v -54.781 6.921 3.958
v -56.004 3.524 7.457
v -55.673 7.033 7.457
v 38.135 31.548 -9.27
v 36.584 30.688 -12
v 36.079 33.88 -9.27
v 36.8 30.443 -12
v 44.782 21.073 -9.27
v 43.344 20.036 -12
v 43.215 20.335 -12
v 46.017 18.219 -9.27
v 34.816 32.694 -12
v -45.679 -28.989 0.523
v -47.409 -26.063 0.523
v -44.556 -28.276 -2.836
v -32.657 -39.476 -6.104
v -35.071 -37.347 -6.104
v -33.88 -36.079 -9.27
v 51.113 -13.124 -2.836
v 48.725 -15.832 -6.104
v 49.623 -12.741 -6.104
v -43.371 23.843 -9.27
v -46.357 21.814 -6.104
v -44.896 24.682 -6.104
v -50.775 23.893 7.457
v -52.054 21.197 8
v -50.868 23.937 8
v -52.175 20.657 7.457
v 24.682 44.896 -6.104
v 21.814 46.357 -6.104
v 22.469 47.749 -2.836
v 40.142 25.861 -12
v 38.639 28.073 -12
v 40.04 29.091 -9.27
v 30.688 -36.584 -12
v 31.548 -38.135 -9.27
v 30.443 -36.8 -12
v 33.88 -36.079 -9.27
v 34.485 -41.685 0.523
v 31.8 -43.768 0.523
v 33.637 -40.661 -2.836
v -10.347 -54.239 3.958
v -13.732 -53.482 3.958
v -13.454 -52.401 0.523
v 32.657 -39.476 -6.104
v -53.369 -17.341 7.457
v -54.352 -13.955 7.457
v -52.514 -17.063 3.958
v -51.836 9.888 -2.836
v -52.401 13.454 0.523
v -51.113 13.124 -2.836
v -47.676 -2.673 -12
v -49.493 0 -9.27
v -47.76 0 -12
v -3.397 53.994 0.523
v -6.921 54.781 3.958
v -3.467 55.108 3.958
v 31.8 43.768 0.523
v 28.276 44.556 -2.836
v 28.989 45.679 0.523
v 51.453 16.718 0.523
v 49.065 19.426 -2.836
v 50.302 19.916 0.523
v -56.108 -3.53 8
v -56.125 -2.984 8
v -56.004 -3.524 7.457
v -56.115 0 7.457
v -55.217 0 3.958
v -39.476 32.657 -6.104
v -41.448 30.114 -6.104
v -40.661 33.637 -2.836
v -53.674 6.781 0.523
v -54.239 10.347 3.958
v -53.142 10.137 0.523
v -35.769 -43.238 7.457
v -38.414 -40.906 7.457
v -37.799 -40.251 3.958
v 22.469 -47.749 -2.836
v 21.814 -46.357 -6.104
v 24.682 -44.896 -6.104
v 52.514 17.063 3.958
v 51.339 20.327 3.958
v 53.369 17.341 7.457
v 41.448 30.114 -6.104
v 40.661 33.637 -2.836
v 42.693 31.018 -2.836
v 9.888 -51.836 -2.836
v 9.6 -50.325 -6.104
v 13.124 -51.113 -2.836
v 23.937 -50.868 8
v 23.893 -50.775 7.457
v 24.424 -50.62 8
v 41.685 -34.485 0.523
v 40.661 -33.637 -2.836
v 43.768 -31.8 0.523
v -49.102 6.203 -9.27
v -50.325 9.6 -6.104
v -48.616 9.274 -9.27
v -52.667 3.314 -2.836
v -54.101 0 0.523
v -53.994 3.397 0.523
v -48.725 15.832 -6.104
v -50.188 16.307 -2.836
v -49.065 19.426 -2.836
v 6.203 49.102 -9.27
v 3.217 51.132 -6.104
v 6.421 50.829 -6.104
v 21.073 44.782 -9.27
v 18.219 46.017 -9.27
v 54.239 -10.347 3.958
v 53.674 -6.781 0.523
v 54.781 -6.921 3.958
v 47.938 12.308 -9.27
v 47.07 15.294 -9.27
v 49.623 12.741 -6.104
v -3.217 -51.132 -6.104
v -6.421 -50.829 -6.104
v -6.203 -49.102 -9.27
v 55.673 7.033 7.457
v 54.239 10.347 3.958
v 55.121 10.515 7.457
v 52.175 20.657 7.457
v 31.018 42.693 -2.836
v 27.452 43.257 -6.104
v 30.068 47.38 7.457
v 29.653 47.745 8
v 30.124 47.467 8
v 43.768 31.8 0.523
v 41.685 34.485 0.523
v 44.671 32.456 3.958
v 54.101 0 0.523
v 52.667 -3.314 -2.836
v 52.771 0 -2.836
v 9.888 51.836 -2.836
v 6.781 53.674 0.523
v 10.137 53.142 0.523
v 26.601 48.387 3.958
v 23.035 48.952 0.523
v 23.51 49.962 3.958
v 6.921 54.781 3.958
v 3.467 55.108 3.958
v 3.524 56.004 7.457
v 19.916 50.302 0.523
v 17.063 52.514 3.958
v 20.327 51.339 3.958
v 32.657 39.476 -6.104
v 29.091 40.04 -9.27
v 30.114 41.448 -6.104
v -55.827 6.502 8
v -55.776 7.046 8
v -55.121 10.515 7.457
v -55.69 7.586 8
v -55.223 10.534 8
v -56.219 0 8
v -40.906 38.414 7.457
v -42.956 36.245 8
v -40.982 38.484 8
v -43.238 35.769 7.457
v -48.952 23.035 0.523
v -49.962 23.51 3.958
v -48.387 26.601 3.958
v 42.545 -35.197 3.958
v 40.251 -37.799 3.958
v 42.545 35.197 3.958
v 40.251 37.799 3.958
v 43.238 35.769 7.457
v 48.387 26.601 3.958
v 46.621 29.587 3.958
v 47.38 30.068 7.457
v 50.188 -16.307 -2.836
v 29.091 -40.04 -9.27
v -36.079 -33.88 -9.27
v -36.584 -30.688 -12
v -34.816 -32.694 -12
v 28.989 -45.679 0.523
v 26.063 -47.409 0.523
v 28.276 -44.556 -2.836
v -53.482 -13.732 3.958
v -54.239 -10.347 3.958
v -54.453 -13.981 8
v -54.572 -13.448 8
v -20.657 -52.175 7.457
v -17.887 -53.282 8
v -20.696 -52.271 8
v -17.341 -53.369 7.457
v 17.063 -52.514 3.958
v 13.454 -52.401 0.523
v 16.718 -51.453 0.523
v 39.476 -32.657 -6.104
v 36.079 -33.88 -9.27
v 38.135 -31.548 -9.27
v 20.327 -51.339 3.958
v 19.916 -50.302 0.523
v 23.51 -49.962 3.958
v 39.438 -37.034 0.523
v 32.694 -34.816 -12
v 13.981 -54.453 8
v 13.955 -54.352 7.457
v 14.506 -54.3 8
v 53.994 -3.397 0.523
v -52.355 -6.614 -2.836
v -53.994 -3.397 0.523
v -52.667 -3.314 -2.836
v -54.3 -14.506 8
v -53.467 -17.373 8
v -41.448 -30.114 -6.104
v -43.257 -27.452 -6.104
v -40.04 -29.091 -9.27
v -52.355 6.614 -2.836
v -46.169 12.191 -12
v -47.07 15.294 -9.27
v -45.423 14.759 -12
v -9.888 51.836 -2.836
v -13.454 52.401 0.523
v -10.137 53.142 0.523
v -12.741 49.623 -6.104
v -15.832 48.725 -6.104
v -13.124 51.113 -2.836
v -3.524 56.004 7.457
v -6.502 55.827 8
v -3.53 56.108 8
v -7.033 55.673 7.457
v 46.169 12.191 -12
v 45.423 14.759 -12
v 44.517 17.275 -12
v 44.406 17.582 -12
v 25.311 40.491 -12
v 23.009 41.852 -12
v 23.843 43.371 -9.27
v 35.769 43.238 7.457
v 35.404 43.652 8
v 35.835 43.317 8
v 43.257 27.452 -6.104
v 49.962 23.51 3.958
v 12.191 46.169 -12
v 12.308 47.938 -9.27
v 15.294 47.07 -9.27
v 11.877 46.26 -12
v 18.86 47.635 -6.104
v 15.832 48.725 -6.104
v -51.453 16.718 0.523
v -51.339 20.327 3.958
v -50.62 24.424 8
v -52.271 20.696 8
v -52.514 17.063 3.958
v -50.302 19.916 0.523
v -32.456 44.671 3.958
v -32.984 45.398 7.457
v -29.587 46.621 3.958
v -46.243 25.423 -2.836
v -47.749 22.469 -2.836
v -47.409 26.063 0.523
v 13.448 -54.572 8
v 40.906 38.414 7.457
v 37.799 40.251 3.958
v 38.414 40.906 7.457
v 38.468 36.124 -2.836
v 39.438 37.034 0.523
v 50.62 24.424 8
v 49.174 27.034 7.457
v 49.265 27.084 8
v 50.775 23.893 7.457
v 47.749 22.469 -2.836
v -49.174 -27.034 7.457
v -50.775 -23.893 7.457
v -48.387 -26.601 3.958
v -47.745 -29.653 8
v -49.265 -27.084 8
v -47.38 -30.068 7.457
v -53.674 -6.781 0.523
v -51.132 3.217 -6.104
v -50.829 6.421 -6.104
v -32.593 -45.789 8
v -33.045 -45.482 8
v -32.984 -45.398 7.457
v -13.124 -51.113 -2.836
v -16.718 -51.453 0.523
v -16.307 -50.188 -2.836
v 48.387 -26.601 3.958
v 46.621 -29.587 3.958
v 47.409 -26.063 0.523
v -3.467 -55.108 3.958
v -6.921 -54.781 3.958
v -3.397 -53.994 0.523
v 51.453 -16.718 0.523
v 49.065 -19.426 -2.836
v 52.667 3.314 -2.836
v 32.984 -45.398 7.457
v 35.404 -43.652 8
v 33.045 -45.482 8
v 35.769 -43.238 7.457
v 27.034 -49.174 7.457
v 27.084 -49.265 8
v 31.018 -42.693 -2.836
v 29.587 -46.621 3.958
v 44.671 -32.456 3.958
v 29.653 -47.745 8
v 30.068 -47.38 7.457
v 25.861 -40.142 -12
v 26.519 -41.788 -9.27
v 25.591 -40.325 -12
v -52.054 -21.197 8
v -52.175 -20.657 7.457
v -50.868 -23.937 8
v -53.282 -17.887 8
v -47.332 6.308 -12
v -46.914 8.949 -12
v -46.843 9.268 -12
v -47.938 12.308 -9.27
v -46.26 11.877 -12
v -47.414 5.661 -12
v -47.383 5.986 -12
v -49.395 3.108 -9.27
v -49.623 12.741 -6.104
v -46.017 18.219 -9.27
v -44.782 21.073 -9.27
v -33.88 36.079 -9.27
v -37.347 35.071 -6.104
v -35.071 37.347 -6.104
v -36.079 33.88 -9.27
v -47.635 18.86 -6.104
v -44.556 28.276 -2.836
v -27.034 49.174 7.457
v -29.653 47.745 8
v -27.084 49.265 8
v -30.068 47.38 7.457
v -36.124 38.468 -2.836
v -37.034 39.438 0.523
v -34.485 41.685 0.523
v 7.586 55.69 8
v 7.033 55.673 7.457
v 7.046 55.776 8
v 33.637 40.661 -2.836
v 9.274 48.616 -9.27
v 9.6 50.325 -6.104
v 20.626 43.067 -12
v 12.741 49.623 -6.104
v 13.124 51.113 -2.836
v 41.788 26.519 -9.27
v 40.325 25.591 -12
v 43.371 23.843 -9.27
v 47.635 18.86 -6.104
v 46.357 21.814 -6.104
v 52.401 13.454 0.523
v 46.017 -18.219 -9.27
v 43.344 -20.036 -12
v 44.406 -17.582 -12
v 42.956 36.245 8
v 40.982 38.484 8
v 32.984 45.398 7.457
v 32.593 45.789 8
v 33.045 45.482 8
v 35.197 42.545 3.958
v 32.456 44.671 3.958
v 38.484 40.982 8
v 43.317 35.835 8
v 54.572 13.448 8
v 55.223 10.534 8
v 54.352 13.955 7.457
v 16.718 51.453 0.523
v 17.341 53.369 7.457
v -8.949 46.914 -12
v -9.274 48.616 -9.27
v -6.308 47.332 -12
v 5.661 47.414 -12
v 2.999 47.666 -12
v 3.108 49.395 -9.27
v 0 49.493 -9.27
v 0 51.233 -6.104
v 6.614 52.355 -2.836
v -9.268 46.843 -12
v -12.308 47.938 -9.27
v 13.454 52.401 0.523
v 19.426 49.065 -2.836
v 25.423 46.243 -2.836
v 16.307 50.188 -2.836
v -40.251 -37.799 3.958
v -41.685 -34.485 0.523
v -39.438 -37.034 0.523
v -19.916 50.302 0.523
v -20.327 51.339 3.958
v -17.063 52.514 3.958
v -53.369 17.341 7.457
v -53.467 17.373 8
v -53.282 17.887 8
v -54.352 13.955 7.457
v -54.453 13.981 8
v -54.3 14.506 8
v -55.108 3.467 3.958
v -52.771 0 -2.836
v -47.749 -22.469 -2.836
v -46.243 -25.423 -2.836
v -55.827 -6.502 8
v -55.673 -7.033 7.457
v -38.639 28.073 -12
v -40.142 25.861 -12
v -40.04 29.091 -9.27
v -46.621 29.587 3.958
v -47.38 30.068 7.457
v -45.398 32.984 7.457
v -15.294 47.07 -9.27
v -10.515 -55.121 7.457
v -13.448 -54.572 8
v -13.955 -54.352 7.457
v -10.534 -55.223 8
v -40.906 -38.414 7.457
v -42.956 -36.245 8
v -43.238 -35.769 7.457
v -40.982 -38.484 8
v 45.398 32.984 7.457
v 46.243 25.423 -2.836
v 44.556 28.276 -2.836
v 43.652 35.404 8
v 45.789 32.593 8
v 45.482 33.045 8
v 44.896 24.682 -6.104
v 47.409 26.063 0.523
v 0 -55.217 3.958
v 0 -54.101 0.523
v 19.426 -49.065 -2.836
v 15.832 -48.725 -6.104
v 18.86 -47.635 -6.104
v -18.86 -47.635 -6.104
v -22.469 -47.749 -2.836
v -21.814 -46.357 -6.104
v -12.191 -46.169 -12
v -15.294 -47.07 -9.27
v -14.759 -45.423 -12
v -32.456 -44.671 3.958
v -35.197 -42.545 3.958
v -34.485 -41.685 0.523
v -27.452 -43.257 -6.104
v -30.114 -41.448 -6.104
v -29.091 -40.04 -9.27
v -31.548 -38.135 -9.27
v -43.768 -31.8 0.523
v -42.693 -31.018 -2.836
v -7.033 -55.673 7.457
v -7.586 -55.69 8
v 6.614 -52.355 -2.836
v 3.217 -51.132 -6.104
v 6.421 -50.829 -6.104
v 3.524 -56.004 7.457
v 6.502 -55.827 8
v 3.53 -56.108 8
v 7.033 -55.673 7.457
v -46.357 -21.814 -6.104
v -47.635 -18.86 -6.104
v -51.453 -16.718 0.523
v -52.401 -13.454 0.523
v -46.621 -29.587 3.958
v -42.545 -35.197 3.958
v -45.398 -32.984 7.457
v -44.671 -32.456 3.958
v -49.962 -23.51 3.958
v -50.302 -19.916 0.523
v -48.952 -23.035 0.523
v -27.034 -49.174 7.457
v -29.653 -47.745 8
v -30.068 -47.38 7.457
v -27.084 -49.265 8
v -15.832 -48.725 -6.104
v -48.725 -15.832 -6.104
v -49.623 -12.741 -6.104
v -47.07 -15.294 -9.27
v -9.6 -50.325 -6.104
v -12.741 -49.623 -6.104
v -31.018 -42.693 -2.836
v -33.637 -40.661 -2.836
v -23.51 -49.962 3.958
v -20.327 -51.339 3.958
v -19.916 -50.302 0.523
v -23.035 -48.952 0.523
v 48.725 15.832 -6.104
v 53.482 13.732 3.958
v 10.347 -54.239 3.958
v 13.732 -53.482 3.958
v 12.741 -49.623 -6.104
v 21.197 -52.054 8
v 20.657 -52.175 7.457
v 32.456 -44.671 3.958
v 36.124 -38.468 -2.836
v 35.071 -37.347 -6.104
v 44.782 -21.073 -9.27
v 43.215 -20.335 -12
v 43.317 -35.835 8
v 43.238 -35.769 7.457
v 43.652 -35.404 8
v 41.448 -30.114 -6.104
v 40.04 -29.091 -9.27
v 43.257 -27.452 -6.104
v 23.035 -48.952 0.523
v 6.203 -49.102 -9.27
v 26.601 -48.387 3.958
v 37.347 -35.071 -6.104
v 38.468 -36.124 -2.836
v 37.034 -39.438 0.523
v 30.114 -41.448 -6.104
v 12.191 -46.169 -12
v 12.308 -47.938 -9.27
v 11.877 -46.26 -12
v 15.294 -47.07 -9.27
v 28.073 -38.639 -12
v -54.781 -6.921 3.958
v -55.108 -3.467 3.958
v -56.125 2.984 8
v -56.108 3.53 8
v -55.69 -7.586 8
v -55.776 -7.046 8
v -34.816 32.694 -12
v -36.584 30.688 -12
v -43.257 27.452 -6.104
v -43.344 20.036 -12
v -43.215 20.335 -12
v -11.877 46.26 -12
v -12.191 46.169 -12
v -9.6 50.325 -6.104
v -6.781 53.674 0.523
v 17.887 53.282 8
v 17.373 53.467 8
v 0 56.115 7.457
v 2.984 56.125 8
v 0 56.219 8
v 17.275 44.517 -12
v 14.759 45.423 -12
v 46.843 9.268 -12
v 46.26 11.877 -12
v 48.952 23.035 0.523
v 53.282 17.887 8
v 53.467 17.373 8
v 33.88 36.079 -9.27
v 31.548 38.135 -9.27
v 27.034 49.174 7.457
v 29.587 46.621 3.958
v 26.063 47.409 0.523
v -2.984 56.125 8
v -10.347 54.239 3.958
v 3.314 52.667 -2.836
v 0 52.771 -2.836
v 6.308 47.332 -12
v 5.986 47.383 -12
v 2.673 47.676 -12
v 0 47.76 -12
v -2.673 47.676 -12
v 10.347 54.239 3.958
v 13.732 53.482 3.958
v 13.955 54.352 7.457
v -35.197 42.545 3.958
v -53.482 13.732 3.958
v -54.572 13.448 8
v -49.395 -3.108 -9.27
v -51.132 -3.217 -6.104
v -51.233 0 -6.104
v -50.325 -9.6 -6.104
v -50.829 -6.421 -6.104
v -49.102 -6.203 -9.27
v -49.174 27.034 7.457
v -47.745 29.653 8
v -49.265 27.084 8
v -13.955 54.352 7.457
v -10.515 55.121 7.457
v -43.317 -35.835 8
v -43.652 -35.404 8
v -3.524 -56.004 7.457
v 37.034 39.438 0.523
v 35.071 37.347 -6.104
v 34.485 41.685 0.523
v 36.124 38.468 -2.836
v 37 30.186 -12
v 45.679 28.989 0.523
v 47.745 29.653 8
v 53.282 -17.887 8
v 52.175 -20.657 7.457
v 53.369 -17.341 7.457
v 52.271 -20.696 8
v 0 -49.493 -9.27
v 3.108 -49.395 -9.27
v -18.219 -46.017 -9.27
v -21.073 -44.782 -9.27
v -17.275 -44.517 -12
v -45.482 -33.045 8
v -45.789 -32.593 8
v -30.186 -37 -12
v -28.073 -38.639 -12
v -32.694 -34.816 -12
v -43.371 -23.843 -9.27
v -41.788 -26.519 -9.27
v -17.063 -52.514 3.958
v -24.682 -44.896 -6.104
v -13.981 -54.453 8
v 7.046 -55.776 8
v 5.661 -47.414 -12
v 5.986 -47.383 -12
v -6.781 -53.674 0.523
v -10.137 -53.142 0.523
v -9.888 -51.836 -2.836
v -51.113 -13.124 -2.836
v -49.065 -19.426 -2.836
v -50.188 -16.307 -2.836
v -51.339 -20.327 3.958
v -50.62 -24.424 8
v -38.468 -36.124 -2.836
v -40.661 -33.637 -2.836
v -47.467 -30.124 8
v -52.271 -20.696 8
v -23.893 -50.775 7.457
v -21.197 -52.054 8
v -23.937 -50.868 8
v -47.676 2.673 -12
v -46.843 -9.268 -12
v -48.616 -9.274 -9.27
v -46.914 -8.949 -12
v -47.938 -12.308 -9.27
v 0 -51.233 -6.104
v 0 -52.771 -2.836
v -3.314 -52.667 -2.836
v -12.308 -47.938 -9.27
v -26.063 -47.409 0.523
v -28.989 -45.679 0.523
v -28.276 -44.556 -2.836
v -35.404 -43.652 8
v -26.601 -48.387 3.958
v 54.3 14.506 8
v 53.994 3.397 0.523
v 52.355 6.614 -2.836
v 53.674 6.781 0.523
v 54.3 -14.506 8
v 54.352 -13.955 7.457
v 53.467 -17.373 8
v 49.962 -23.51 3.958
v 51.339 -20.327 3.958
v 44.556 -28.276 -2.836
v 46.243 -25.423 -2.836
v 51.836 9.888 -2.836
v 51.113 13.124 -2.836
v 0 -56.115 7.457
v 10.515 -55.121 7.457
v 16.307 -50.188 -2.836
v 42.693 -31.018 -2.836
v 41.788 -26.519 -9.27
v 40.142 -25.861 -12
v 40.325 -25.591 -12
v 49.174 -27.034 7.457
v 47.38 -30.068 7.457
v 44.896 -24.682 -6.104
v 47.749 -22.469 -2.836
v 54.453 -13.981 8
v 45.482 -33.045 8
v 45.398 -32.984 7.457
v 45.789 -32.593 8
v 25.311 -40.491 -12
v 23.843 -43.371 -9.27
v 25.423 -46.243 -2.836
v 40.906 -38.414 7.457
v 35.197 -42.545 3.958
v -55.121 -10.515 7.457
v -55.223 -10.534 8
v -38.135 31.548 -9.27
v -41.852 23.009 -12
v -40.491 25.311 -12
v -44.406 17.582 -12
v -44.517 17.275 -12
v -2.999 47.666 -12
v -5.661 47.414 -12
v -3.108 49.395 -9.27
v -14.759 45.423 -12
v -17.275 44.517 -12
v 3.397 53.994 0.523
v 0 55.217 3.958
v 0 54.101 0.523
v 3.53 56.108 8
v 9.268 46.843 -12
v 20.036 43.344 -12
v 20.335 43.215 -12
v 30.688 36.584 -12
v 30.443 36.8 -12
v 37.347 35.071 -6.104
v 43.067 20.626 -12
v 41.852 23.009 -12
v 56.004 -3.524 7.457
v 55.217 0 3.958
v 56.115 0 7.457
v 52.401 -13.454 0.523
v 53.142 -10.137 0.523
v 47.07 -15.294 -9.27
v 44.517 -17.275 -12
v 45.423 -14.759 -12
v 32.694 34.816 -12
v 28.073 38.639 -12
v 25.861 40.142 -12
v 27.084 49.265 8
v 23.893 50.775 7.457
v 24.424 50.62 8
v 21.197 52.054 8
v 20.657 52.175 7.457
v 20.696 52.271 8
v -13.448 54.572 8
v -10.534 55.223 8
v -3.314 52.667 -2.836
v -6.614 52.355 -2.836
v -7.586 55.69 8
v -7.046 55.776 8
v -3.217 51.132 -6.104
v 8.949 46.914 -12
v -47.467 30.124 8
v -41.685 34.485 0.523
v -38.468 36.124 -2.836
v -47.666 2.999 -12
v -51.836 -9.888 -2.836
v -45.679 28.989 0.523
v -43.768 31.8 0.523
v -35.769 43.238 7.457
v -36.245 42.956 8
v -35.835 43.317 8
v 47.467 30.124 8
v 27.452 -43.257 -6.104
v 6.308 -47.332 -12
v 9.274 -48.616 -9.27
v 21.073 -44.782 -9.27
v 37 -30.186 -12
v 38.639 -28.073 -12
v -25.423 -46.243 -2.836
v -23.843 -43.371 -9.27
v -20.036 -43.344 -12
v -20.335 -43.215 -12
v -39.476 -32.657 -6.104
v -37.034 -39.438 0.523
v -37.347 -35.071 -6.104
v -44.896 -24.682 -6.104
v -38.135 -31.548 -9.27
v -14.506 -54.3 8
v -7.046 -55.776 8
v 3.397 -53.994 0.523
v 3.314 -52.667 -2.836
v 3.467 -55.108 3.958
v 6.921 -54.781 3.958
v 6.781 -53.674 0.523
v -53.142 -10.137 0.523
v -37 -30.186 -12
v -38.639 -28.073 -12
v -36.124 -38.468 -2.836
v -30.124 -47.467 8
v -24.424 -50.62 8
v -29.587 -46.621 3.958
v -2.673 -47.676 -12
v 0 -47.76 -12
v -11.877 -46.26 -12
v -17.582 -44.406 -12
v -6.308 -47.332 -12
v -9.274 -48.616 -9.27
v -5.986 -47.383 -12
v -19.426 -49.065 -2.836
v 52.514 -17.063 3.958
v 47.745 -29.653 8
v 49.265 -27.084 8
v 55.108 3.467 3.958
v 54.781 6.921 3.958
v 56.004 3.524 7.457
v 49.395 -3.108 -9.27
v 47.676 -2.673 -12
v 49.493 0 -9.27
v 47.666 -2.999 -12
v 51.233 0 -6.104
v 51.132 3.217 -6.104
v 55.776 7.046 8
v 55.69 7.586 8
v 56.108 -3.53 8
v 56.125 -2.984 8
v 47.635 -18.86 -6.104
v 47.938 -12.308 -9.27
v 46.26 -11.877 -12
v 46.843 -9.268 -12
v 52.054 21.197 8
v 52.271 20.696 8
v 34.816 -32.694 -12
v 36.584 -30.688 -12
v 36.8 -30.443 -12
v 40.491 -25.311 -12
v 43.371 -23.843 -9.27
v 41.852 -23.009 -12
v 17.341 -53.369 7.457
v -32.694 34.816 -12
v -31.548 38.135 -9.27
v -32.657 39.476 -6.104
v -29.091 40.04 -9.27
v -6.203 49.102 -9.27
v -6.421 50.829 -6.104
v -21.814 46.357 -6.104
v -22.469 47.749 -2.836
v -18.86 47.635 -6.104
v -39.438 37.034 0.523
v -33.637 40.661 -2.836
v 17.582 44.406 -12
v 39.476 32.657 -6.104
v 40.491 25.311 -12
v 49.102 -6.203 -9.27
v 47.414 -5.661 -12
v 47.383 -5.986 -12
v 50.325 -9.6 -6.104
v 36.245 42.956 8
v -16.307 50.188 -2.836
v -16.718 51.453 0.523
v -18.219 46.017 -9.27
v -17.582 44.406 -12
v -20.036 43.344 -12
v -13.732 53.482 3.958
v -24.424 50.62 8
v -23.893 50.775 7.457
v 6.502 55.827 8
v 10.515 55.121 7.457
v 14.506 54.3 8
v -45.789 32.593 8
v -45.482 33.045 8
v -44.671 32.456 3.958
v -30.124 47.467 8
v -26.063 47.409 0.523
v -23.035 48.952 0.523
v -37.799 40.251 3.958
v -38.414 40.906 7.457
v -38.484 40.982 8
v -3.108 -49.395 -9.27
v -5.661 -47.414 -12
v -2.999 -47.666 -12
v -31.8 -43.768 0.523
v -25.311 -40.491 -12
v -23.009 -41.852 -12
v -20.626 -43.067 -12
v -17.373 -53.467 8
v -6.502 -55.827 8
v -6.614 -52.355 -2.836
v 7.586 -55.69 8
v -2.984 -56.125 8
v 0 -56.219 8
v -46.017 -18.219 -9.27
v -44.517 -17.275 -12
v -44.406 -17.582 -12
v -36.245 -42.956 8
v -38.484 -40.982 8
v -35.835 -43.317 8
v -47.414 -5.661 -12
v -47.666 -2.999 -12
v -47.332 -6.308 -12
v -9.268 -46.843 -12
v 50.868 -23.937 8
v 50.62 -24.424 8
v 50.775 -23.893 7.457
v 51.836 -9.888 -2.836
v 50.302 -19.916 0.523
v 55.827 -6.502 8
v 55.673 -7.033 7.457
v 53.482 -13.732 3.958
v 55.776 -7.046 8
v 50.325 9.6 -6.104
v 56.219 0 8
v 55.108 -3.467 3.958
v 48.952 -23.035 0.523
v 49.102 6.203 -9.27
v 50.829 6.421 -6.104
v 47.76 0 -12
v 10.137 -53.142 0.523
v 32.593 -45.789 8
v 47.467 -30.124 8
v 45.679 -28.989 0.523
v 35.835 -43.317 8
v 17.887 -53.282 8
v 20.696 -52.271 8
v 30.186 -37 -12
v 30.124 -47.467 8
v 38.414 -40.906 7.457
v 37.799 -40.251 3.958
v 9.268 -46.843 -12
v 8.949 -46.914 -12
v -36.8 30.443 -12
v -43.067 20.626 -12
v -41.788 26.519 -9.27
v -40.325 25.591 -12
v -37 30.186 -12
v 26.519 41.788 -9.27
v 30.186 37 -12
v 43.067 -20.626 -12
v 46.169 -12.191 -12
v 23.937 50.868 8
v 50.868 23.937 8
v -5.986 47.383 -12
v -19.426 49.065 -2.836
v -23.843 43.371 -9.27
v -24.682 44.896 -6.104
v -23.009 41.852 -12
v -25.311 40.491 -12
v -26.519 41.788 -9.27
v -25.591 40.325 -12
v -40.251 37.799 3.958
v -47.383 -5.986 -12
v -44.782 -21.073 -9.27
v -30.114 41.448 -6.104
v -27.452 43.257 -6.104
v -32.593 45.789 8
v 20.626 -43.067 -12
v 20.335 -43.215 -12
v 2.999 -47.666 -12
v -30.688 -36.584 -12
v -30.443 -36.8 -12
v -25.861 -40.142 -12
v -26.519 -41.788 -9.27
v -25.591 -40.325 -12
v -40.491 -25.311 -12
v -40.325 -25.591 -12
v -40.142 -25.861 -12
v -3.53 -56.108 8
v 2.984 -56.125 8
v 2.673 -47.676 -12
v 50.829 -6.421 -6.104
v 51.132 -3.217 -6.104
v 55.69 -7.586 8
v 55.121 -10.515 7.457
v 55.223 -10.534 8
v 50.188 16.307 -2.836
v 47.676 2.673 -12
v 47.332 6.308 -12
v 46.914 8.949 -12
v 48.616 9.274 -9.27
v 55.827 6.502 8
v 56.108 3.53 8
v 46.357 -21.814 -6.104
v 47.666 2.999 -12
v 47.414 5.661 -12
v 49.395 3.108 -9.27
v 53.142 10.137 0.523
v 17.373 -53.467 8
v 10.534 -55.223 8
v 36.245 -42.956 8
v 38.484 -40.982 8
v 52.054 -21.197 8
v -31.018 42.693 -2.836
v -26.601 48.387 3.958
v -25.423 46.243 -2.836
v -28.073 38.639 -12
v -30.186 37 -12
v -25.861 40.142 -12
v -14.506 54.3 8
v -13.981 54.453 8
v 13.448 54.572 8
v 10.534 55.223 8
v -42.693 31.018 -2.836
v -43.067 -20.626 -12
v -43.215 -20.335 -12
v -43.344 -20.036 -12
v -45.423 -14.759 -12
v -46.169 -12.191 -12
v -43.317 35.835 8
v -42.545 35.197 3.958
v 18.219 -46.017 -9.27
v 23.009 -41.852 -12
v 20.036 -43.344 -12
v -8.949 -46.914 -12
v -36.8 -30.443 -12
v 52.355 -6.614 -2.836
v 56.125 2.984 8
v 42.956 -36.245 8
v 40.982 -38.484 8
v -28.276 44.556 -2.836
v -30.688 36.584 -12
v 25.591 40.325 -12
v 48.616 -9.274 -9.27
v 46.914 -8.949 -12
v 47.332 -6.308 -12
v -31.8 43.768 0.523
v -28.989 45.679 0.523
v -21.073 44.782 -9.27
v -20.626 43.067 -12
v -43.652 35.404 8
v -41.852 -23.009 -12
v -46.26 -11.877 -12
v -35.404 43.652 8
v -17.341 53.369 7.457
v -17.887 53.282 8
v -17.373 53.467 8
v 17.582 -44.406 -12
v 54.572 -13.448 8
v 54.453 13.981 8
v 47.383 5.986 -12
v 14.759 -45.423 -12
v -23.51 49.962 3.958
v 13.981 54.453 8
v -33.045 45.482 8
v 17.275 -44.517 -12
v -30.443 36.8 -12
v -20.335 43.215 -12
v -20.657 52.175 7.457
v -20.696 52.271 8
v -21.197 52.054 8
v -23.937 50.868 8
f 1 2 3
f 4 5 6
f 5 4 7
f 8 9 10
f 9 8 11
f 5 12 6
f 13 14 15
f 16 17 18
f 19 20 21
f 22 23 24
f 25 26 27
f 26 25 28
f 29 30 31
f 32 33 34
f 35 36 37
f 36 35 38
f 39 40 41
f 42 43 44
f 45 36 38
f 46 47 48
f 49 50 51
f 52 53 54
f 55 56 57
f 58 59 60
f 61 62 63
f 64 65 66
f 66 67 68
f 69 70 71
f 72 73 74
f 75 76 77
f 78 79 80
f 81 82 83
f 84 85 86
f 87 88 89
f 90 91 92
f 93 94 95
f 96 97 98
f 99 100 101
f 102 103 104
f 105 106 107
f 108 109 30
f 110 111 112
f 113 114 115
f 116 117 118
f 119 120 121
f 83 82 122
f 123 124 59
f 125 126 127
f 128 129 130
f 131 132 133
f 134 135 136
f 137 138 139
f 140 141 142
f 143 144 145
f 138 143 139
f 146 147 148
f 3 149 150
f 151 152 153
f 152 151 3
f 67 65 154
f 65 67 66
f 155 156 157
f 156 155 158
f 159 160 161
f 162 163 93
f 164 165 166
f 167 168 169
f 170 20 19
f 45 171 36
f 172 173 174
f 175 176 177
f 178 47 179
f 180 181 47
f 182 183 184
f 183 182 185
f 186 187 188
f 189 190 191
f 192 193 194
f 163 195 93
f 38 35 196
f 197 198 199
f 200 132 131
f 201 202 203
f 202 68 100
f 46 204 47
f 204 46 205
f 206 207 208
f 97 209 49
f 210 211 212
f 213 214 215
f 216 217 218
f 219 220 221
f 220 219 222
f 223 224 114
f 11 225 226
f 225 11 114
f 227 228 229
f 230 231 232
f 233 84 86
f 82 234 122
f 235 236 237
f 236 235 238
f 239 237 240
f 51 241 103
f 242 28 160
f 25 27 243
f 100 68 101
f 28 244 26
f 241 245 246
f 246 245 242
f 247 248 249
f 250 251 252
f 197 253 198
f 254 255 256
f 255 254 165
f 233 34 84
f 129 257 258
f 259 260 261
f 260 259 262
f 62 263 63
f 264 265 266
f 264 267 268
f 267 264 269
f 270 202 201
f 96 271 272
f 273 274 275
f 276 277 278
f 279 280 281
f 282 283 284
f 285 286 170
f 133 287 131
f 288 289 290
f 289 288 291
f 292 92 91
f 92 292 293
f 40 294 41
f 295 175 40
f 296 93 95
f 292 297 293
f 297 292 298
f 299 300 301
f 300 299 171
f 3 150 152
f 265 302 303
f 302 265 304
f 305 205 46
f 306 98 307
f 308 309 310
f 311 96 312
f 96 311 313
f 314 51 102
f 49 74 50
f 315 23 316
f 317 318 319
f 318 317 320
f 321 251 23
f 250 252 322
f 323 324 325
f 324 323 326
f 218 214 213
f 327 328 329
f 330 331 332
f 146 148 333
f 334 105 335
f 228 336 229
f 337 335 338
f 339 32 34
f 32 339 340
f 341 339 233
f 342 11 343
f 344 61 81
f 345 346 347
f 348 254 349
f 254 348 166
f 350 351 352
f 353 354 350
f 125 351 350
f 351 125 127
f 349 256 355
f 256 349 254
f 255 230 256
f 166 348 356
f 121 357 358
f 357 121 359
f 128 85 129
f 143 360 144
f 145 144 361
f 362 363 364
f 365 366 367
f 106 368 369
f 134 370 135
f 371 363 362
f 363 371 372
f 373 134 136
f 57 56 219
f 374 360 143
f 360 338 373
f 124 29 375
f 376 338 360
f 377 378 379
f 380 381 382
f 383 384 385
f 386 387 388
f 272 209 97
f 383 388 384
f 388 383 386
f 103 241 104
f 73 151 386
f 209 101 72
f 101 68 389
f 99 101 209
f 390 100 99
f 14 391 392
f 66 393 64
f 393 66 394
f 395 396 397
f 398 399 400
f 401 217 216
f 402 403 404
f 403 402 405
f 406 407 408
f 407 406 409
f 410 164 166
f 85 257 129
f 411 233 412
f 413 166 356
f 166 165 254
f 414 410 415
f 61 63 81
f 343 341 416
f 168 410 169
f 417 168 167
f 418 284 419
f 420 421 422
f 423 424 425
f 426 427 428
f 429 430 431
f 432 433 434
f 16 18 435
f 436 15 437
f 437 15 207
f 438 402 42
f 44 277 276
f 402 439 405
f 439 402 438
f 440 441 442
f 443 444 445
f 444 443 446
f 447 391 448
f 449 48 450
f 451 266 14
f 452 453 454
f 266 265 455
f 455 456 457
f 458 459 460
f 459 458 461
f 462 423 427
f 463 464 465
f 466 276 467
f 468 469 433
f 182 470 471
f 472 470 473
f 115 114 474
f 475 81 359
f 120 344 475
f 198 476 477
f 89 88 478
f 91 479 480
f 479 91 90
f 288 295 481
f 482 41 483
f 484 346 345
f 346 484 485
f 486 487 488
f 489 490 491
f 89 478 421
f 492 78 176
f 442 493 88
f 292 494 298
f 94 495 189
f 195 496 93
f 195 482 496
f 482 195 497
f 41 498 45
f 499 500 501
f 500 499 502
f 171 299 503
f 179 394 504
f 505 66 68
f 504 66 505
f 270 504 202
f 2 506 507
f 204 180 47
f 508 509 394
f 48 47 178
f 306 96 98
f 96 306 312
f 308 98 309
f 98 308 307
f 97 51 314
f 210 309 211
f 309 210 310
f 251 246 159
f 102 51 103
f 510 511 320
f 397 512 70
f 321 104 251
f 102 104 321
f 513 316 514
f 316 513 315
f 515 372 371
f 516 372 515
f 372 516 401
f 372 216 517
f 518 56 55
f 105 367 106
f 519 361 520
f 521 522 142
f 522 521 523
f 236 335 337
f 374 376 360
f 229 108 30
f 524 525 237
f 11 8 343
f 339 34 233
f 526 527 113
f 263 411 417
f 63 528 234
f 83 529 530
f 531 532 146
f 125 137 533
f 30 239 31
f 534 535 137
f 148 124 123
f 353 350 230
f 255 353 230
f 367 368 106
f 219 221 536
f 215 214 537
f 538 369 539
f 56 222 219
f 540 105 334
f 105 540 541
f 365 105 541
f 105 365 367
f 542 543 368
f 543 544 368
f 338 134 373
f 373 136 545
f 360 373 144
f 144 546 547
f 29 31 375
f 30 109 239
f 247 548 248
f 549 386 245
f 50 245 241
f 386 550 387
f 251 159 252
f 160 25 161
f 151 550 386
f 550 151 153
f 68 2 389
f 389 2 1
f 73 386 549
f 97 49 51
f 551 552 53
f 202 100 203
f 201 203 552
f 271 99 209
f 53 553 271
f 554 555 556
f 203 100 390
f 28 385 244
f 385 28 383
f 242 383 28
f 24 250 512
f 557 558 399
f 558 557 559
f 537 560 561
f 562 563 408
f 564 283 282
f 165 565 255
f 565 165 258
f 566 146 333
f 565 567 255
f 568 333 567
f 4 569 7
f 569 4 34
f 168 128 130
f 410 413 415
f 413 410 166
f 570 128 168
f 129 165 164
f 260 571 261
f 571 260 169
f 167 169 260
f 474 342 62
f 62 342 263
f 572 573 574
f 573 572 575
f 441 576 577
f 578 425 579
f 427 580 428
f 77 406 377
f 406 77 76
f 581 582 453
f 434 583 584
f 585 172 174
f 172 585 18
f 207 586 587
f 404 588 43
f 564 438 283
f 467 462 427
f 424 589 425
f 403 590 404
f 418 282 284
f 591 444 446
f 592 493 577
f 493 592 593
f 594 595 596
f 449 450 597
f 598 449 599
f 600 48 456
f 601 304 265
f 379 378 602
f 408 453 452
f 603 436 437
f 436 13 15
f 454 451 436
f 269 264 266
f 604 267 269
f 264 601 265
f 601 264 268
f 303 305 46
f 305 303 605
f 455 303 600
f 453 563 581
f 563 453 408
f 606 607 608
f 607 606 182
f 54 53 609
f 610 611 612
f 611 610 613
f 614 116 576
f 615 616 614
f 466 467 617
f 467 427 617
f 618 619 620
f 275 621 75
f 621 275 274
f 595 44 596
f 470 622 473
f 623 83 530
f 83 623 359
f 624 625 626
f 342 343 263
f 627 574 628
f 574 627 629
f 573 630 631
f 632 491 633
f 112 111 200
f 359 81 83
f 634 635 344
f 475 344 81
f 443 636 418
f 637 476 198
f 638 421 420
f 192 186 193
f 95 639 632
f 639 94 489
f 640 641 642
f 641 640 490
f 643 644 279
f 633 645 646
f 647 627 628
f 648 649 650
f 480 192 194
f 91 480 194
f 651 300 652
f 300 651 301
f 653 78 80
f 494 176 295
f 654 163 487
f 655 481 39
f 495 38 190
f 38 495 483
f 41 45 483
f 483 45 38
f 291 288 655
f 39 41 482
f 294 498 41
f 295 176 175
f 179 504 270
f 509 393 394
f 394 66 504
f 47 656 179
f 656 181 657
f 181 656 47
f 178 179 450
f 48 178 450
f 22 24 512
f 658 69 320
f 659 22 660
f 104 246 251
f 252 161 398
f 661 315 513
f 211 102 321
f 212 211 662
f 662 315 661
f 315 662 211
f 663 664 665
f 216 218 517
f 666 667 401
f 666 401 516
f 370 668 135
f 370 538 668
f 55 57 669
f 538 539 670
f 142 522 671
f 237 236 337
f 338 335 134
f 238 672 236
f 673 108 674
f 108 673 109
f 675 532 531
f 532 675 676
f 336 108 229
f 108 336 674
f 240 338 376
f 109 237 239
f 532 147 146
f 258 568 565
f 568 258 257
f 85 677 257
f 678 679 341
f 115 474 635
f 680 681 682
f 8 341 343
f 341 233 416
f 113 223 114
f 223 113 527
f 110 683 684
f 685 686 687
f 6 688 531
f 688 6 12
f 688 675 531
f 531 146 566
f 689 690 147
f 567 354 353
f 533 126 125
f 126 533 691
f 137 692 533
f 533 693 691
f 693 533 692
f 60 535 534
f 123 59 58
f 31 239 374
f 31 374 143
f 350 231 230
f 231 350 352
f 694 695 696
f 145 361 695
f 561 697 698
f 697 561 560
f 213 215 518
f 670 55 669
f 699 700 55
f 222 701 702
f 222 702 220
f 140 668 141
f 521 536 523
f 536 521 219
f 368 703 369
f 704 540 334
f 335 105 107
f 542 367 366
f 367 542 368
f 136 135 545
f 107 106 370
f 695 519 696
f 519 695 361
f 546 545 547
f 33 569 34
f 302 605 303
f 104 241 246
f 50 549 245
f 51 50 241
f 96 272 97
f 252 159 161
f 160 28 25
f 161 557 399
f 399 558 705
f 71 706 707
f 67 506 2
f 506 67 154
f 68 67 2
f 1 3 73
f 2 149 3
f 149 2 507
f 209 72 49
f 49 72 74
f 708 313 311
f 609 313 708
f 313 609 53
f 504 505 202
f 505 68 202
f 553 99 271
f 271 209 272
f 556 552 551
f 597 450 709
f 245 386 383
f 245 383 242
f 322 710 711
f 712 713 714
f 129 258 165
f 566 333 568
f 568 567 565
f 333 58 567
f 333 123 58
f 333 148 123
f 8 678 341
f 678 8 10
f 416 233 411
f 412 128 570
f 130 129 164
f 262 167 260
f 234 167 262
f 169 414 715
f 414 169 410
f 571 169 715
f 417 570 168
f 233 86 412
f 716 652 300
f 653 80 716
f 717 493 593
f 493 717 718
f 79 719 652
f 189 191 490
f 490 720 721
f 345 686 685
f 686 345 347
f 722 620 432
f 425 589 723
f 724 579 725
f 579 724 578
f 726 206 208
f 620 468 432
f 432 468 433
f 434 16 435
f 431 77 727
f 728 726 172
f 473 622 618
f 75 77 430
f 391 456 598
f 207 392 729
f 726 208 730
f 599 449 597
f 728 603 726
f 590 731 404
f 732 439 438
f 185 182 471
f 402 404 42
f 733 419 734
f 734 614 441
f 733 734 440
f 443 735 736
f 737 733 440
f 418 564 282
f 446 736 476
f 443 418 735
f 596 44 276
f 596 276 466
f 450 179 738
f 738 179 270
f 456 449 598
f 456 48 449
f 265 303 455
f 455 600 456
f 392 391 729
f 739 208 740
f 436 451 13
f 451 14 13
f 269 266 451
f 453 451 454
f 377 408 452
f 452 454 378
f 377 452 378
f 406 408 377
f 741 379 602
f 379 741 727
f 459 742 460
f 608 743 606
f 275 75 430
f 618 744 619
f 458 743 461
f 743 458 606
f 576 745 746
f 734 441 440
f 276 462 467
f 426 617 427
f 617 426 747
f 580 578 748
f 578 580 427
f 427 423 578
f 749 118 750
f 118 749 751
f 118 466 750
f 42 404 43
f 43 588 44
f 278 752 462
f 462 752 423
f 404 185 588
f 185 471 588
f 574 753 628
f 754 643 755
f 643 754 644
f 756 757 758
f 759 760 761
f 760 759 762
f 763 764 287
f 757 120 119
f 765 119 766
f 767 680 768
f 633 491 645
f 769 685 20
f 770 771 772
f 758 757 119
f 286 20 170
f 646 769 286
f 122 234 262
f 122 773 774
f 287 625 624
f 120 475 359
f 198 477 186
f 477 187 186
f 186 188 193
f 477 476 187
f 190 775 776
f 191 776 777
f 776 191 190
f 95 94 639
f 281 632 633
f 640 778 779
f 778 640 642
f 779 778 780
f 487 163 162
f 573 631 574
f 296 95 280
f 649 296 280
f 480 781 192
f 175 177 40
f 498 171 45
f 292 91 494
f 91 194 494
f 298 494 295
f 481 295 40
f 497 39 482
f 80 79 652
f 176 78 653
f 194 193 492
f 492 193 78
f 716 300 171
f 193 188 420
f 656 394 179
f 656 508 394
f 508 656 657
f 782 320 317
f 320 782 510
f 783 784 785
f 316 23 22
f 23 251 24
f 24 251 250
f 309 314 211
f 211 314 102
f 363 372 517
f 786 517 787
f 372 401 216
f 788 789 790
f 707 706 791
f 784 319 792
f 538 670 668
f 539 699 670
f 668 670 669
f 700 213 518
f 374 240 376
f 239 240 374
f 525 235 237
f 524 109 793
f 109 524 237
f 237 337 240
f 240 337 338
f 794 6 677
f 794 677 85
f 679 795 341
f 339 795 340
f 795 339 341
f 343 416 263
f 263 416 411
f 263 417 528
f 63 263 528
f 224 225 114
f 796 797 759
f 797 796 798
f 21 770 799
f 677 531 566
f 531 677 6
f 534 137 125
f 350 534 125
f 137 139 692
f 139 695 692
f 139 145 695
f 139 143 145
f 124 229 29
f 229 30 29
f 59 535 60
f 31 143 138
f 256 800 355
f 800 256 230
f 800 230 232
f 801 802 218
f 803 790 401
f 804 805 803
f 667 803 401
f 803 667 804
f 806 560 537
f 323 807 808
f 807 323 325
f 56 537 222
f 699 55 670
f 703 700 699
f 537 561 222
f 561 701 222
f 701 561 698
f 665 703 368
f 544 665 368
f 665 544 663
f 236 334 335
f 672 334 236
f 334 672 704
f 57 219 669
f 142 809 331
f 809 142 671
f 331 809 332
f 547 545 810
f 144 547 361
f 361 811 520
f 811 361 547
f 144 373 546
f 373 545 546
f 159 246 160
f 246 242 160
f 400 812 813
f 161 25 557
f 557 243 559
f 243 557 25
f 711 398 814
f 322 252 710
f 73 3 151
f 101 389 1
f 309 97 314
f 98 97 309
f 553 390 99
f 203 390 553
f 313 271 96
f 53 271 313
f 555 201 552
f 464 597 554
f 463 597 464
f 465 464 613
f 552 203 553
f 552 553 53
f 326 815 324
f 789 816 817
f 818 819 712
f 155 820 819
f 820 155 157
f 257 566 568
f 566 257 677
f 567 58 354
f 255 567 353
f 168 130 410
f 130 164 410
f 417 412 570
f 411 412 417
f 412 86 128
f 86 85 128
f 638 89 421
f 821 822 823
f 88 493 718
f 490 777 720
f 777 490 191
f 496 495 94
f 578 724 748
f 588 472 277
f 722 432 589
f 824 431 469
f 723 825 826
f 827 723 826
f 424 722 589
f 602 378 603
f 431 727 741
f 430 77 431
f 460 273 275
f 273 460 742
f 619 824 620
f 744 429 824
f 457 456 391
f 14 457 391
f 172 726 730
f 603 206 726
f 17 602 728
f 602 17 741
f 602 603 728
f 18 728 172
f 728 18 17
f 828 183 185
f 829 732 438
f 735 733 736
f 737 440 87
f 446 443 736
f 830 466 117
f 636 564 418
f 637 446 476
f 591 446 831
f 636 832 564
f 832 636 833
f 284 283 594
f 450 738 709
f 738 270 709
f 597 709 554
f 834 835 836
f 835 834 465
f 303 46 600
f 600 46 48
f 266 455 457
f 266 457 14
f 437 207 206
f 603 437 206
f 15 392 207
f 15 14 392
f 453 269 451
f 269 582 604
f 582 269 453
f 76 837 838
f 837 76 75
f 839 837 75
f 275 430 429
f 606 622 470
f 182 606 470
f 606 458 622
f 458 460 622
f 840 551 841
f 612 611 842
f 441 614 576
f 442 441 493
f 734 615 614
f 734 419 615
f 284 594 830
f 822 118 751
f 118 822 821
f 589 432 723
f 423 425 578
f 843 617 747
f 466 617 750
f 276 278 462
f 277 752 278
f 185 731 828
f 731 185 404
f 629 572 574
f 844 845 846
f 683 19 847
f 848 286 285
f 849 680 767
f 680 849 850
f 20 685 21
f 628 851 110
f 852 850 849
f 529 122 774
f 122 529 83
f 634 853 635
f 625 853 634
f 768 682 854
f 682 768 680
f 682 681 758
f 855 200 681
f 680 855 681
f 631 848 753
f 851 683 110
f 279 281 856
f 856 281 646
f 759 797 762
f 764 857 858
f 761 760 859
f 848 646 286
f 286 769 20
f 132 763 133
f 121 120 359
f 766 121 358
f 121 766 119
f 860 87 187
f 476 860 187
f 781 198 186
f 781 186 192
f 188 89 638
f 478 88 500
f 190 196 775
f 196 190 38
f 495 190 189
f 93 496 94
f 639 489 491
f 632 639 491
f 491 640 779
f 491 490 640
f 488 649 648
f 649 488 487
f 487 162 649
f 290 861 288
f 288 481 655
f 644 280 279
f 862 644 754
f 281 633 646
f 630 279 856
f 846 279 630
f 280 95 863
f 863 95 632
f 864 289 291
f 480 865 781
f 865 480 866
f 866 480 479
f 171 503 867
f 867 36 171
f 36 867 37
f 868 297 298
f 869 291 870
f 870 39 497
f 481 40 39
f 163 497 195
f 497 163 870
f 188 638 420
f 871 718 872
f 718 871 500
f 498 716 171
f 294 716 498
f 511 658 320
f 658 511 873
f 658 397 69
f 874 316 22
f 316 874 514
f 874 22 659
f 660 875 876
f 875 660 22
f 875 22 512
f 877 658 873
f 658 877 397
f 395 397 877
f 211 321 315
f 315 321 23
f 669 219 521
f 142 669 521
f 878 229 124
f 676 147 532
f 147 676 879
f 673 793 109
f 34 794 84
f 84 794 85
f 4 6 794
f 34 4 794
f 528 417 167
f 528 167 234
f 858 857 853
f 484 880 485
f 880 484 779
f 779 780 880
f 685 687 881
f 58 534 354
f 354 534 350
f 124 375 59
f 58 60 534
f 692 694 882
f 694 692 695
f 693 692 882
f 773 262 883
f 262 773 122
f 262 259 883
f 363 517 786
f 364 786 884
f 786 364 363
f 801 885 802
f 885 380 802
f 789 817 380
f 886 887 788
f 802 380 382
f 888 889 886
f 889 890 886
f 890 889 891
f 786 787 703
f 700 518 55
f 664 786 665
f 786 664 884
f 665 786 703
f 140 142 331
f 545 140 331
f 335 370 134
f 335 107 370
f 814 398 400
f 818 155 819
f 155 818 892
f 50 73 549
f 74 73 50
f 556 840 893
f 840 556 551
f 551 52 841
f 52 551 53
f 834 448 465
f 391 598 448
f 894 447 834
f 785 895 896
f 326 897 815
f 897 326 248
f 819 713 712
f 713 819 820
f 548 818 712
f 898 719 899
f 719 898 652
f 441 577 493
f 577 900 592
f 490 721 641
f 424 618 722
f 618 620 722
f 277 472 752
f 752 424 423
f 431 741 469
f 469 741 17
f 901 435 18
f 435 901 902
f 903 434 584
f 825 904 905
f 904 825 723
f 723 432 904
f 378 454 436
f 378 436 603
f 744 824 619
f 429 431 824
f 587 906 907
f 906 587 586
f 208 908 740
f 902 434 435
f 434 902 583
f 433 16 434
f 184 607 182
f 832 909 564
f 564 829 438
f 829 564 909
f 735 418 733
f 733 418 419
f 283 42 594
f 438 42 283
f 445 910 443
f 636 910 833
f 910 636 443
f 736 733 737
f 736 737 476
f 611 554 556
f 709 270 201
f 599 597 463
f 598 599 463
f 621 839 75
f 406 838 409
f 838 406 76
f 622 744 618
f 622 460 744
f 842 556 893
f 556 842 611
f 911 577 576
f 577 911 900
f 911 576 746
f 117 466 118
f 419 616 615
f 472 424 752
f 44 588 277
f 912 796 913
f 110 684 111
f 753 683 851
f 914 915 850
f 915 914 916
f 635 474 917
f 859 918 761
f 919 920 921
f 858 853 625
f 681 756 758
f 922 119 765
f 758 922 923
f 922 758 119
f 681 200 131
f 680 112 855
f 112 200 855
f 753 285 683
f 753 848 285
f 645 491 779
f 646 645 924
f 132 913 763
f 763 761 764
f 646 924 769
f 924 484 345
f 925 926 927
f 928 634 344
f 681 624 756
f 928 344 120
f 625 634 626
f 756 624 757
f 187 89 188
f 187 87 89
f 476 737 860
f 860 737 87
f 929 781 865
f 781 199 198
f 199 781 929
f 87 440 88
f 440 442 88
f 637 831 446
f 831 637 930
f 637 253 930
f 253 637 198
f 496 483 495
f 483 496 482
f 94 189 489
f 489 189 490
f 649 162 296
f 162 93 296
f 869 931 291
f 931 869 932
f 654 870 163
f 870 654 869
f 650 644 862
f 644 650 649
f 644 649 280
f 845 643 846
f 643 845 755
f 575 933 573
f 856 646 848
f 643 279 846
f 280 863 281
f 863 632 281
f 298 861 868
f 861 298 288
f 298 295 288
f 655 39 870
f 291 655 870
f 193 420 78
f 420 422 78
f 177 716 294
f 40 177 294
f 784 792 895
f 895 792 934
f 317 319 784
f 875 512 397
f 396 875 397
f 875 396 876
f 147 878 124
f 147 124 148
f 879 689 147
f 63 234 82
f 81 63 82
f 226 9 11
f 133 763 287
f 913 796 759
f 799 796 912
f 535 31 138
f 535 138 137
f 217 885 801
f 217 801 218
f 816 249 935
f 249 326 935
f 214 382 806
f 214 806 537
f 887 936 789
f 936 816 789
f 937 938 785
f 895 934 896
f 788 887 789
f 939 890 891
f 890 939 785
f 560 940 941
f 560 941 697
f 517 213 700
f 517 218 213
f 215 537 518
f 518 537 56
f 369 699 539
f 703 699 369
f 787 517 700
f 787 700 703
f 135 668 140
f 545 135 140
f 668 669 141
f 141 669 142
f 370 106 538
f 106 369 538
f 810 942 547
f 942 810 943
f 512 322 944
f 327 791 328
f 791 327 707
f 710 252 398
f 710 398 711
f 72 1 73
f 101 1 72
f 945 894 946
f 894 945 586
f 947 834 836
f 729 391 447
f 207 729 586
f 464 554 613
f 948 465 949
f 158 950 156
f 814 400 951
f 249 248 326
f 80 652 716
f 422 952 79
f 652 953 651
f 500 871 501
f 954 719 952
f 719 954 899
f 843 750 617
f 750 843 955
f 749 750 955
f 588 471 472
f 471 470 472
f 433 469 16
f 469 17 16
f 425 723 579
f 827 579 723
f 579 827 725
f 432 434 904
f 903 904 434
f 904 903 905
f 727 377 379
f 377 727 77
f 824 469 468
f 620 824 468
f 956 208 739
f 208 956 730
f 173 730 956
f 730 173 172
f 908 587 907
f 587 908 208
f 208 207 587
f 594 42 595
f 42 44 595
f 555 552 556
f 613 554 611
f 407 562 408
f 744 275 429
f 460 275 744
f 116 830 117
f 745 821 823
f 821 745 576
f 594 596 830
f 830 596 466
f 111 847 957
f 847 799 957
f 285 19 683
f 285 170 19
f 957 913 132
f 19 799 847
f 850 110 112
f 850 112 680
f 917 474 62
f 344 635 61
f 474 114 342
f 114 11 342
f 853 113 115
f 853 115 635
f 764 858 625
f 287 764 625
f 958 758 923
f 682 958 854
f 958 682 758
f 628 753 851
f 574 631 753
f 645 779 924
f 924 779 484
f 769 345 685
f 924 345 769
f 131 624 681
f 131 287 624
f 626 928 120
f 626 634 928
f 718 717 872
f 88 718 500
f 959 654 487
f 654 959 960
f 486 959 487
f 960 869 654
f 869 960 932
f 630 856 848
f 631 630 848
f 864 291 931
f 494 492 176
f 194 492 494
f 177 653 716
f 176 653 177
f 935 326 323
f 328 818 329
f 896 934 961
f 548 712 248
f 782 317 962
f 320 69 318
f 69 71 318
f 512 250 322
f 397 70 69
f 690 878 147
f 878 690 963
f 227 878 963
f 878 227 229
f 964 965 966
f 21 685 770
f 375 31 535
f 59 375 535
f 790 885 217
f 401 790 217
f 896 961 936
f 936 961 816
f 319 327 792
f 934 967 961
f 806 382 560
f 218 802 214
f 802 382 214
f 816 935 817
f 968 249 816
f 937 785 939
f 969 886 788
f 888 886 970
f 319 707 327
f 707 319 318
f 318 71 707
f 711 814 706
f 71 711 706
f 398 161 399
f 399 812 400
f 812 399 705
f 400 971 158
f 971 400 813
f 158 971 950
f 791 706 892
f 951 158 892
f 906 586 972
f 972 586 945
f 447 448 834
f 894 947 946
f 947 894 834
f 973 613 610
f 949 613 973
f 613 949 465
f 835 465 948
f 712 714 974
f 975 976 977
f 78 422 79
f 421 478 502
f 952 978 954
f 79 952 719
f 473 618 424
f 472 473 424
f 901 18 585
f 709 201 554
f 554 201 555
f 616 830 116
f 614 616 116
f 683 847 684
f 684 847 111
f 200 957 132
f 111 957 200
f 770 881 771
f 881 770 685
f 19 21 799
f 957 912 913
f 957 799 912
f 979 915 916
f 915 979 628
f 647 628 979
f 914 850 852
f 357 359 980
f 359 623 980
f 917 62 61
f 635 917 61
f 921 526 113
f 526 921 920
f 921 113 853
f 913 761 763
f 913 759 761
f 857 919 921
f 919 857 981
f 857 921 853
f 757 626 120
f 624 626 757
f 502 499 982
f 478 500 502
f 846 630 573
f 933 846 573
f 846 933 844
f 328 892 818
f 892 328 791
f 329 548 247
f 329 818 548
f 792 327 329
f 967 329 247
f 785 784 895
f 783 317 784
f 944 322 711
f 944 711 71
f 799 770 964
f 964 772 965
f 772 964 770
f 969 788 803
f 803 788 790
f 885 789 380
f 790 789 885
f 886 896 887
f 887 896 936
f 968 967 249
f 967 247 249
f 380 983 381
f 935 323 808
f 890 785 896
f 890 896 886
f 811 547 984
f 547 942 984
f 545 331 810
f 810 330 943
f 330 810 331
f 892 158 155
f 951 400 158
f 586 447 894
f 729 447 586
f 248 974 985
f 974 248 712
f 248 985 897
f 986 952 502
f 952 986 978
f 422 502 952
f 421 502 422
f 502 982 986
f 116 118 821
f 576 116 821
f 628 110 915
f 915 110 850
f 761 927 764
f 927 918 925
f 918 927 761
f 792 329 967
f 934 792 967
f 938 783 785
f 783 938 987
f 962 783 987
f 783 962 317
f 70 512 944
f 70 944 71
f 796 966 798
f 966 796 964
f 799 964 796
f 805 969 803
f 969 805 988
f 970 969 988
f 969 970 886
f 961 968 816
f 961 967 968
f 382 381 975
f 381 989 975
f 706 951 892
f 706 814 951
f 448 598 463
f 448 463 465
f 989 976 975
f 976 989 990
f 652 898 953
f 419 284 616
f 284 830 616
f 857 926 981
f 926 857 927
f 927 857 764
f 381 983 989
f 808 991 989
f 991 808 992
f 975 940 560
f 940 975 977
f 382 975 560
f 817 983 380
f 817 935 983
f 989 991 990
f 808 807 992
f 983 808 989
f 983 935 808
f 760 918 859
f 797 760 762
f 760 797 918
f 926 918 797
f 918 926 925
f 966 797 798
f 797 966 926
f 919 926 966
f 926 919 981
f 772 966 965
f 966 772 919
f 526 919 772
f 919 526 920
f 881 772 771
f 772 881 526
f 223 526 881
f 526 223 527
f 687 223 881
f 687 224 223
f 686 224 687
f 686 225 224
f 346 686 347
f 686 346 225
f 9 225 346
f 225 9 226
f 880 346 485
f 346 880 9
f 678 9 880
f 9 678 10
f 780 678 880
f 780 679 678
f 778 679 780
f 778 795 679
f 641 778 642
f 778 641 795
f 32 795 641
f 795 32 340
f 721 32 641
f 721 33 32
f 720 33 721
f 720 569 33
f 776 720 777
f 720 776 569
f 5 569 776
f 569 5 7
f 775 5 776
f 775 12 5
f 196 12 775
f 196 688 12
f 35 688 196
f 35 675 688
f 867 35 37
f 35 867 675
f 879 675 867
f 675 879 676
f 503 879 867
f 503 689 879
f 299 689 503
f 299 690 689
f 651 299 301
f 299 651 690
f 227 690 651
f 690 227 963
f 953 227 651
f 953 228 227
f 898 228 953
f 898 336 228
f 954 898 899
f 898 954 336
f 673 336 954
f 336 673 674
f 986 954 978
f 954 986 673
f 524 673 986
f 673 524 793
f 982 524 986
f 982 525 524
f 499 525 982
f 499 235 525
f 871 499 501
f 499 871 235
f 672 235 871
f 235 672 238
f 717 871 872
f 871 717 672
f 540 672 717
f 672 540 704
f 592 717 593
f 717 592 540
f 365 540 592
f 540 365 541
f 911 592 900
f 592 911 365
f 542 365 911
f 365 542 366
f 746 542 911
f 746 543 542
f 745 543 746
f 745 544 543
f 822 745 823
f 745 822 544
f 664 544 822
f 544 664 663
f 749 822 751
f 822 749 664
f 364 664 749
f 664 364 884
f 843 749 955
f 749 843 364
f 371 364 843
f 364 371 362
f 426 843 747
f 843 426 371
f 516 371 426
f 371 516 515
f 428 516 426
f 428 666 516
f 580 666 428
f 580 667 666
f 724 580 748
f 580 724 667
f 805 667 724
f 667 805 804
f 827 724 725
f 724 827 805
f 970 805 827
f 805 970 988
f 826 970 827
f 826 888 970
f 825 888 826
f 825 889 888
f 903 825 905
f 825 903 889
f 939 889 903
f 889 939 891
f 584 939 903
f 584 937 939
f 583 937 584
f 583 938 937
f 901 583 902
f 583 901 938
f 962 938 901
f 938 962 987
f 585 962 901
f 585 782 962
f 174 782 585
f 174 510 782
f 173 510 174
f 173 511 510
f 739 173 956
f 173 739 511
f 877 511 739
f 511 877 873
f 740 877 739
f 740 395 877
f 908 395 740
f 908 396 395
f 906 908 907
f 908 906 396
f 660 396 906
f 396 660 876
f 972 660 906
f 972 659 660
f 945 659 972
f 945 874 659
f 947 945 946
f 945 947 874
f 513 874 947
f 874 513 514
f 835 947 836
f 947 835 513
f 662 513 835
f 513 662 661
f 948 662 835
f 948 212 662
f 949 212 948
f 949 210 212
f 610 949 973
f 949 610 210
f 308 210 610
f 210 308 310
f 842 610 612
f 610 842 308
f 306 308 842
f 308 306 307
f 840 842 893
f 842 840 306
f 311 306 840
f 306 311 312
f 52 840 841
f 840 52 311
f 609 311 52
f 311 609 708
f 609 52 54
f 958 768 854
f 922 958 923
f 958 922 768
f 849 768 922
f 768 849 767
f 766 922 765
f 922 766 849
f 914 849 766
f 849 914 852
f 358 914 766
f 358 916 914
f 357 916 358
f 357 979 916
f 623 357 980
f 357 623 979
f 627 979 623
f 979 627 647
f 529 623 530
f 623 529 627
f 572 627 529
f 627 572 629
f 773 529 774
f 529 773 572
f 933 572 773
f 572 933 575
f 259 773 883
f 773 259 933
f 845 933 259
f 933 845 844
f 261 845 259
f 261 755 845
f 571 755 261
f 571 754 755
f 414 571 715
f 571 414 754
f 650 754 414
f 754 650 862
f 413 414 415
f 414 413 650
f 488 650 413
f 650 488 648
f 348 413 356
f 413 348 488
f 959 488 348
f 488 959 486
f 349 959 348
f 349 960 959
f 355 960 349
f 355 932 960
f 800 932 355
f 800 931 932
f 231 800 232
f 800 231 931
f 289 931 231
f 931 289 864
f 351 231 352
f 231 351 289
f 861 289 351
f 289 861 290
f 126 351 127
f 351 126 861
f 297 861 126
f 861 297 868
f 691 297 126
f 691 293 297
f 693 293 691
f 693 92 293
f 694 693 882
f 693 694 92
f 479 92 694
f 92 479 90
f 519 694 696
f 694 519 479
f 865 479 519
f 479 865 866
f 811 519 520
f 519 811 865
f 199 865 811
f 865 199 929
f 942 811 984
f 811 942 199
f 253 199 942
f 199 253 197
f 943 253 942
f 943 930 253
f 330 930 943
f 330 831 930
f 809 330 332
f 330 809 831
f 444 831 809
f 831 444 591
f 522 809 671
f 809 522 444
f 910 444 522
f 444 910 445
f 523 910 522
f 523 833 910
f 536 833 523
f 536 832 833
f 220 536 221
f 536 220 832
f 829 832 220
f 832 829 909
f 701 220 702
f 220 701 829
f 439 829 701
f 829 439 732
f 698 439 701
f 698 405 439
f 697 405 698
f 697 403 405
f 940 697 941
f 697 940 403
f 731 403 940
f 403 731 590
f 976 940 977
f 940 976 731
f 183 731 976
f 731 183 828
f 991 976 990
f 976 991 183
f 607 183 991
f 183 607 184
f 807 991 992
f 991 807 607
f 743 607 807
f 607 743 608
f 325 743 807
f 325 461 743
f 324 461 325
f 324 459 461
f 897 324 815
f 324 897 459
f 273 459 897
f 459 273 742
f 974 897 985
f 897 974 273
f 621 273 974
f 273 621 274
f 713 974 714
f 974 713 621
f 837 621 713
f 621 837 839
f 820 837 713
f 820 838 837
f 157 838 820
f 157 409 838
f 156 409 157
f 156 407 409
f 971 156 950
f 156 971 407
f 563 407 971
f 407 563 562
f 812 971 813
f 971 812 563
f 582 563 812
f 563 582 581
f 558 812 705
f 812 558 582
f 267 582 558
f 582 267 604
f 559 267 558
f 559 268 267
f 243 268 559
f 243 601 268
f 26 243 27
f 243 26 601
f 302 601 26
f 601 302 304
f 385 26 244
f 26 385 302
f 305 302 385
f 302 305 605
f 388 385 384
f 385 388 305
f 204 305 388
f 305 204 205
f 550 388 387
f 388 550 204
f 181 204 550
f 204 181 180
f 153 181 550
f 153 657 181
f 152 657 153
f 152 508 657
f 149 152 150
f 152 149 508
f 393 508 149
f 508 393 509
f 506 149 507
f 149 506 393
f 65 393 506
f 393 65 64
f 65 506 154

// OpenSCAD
$fn = 100;
translate(v = [0, 0, 20])
{
  intersection()
  {
    sphere(r = 57.5);
    translate(v = [0, 0, -32])
    {
      cylinder(h = 20, r = 95, center = false);
    }
  }
}
